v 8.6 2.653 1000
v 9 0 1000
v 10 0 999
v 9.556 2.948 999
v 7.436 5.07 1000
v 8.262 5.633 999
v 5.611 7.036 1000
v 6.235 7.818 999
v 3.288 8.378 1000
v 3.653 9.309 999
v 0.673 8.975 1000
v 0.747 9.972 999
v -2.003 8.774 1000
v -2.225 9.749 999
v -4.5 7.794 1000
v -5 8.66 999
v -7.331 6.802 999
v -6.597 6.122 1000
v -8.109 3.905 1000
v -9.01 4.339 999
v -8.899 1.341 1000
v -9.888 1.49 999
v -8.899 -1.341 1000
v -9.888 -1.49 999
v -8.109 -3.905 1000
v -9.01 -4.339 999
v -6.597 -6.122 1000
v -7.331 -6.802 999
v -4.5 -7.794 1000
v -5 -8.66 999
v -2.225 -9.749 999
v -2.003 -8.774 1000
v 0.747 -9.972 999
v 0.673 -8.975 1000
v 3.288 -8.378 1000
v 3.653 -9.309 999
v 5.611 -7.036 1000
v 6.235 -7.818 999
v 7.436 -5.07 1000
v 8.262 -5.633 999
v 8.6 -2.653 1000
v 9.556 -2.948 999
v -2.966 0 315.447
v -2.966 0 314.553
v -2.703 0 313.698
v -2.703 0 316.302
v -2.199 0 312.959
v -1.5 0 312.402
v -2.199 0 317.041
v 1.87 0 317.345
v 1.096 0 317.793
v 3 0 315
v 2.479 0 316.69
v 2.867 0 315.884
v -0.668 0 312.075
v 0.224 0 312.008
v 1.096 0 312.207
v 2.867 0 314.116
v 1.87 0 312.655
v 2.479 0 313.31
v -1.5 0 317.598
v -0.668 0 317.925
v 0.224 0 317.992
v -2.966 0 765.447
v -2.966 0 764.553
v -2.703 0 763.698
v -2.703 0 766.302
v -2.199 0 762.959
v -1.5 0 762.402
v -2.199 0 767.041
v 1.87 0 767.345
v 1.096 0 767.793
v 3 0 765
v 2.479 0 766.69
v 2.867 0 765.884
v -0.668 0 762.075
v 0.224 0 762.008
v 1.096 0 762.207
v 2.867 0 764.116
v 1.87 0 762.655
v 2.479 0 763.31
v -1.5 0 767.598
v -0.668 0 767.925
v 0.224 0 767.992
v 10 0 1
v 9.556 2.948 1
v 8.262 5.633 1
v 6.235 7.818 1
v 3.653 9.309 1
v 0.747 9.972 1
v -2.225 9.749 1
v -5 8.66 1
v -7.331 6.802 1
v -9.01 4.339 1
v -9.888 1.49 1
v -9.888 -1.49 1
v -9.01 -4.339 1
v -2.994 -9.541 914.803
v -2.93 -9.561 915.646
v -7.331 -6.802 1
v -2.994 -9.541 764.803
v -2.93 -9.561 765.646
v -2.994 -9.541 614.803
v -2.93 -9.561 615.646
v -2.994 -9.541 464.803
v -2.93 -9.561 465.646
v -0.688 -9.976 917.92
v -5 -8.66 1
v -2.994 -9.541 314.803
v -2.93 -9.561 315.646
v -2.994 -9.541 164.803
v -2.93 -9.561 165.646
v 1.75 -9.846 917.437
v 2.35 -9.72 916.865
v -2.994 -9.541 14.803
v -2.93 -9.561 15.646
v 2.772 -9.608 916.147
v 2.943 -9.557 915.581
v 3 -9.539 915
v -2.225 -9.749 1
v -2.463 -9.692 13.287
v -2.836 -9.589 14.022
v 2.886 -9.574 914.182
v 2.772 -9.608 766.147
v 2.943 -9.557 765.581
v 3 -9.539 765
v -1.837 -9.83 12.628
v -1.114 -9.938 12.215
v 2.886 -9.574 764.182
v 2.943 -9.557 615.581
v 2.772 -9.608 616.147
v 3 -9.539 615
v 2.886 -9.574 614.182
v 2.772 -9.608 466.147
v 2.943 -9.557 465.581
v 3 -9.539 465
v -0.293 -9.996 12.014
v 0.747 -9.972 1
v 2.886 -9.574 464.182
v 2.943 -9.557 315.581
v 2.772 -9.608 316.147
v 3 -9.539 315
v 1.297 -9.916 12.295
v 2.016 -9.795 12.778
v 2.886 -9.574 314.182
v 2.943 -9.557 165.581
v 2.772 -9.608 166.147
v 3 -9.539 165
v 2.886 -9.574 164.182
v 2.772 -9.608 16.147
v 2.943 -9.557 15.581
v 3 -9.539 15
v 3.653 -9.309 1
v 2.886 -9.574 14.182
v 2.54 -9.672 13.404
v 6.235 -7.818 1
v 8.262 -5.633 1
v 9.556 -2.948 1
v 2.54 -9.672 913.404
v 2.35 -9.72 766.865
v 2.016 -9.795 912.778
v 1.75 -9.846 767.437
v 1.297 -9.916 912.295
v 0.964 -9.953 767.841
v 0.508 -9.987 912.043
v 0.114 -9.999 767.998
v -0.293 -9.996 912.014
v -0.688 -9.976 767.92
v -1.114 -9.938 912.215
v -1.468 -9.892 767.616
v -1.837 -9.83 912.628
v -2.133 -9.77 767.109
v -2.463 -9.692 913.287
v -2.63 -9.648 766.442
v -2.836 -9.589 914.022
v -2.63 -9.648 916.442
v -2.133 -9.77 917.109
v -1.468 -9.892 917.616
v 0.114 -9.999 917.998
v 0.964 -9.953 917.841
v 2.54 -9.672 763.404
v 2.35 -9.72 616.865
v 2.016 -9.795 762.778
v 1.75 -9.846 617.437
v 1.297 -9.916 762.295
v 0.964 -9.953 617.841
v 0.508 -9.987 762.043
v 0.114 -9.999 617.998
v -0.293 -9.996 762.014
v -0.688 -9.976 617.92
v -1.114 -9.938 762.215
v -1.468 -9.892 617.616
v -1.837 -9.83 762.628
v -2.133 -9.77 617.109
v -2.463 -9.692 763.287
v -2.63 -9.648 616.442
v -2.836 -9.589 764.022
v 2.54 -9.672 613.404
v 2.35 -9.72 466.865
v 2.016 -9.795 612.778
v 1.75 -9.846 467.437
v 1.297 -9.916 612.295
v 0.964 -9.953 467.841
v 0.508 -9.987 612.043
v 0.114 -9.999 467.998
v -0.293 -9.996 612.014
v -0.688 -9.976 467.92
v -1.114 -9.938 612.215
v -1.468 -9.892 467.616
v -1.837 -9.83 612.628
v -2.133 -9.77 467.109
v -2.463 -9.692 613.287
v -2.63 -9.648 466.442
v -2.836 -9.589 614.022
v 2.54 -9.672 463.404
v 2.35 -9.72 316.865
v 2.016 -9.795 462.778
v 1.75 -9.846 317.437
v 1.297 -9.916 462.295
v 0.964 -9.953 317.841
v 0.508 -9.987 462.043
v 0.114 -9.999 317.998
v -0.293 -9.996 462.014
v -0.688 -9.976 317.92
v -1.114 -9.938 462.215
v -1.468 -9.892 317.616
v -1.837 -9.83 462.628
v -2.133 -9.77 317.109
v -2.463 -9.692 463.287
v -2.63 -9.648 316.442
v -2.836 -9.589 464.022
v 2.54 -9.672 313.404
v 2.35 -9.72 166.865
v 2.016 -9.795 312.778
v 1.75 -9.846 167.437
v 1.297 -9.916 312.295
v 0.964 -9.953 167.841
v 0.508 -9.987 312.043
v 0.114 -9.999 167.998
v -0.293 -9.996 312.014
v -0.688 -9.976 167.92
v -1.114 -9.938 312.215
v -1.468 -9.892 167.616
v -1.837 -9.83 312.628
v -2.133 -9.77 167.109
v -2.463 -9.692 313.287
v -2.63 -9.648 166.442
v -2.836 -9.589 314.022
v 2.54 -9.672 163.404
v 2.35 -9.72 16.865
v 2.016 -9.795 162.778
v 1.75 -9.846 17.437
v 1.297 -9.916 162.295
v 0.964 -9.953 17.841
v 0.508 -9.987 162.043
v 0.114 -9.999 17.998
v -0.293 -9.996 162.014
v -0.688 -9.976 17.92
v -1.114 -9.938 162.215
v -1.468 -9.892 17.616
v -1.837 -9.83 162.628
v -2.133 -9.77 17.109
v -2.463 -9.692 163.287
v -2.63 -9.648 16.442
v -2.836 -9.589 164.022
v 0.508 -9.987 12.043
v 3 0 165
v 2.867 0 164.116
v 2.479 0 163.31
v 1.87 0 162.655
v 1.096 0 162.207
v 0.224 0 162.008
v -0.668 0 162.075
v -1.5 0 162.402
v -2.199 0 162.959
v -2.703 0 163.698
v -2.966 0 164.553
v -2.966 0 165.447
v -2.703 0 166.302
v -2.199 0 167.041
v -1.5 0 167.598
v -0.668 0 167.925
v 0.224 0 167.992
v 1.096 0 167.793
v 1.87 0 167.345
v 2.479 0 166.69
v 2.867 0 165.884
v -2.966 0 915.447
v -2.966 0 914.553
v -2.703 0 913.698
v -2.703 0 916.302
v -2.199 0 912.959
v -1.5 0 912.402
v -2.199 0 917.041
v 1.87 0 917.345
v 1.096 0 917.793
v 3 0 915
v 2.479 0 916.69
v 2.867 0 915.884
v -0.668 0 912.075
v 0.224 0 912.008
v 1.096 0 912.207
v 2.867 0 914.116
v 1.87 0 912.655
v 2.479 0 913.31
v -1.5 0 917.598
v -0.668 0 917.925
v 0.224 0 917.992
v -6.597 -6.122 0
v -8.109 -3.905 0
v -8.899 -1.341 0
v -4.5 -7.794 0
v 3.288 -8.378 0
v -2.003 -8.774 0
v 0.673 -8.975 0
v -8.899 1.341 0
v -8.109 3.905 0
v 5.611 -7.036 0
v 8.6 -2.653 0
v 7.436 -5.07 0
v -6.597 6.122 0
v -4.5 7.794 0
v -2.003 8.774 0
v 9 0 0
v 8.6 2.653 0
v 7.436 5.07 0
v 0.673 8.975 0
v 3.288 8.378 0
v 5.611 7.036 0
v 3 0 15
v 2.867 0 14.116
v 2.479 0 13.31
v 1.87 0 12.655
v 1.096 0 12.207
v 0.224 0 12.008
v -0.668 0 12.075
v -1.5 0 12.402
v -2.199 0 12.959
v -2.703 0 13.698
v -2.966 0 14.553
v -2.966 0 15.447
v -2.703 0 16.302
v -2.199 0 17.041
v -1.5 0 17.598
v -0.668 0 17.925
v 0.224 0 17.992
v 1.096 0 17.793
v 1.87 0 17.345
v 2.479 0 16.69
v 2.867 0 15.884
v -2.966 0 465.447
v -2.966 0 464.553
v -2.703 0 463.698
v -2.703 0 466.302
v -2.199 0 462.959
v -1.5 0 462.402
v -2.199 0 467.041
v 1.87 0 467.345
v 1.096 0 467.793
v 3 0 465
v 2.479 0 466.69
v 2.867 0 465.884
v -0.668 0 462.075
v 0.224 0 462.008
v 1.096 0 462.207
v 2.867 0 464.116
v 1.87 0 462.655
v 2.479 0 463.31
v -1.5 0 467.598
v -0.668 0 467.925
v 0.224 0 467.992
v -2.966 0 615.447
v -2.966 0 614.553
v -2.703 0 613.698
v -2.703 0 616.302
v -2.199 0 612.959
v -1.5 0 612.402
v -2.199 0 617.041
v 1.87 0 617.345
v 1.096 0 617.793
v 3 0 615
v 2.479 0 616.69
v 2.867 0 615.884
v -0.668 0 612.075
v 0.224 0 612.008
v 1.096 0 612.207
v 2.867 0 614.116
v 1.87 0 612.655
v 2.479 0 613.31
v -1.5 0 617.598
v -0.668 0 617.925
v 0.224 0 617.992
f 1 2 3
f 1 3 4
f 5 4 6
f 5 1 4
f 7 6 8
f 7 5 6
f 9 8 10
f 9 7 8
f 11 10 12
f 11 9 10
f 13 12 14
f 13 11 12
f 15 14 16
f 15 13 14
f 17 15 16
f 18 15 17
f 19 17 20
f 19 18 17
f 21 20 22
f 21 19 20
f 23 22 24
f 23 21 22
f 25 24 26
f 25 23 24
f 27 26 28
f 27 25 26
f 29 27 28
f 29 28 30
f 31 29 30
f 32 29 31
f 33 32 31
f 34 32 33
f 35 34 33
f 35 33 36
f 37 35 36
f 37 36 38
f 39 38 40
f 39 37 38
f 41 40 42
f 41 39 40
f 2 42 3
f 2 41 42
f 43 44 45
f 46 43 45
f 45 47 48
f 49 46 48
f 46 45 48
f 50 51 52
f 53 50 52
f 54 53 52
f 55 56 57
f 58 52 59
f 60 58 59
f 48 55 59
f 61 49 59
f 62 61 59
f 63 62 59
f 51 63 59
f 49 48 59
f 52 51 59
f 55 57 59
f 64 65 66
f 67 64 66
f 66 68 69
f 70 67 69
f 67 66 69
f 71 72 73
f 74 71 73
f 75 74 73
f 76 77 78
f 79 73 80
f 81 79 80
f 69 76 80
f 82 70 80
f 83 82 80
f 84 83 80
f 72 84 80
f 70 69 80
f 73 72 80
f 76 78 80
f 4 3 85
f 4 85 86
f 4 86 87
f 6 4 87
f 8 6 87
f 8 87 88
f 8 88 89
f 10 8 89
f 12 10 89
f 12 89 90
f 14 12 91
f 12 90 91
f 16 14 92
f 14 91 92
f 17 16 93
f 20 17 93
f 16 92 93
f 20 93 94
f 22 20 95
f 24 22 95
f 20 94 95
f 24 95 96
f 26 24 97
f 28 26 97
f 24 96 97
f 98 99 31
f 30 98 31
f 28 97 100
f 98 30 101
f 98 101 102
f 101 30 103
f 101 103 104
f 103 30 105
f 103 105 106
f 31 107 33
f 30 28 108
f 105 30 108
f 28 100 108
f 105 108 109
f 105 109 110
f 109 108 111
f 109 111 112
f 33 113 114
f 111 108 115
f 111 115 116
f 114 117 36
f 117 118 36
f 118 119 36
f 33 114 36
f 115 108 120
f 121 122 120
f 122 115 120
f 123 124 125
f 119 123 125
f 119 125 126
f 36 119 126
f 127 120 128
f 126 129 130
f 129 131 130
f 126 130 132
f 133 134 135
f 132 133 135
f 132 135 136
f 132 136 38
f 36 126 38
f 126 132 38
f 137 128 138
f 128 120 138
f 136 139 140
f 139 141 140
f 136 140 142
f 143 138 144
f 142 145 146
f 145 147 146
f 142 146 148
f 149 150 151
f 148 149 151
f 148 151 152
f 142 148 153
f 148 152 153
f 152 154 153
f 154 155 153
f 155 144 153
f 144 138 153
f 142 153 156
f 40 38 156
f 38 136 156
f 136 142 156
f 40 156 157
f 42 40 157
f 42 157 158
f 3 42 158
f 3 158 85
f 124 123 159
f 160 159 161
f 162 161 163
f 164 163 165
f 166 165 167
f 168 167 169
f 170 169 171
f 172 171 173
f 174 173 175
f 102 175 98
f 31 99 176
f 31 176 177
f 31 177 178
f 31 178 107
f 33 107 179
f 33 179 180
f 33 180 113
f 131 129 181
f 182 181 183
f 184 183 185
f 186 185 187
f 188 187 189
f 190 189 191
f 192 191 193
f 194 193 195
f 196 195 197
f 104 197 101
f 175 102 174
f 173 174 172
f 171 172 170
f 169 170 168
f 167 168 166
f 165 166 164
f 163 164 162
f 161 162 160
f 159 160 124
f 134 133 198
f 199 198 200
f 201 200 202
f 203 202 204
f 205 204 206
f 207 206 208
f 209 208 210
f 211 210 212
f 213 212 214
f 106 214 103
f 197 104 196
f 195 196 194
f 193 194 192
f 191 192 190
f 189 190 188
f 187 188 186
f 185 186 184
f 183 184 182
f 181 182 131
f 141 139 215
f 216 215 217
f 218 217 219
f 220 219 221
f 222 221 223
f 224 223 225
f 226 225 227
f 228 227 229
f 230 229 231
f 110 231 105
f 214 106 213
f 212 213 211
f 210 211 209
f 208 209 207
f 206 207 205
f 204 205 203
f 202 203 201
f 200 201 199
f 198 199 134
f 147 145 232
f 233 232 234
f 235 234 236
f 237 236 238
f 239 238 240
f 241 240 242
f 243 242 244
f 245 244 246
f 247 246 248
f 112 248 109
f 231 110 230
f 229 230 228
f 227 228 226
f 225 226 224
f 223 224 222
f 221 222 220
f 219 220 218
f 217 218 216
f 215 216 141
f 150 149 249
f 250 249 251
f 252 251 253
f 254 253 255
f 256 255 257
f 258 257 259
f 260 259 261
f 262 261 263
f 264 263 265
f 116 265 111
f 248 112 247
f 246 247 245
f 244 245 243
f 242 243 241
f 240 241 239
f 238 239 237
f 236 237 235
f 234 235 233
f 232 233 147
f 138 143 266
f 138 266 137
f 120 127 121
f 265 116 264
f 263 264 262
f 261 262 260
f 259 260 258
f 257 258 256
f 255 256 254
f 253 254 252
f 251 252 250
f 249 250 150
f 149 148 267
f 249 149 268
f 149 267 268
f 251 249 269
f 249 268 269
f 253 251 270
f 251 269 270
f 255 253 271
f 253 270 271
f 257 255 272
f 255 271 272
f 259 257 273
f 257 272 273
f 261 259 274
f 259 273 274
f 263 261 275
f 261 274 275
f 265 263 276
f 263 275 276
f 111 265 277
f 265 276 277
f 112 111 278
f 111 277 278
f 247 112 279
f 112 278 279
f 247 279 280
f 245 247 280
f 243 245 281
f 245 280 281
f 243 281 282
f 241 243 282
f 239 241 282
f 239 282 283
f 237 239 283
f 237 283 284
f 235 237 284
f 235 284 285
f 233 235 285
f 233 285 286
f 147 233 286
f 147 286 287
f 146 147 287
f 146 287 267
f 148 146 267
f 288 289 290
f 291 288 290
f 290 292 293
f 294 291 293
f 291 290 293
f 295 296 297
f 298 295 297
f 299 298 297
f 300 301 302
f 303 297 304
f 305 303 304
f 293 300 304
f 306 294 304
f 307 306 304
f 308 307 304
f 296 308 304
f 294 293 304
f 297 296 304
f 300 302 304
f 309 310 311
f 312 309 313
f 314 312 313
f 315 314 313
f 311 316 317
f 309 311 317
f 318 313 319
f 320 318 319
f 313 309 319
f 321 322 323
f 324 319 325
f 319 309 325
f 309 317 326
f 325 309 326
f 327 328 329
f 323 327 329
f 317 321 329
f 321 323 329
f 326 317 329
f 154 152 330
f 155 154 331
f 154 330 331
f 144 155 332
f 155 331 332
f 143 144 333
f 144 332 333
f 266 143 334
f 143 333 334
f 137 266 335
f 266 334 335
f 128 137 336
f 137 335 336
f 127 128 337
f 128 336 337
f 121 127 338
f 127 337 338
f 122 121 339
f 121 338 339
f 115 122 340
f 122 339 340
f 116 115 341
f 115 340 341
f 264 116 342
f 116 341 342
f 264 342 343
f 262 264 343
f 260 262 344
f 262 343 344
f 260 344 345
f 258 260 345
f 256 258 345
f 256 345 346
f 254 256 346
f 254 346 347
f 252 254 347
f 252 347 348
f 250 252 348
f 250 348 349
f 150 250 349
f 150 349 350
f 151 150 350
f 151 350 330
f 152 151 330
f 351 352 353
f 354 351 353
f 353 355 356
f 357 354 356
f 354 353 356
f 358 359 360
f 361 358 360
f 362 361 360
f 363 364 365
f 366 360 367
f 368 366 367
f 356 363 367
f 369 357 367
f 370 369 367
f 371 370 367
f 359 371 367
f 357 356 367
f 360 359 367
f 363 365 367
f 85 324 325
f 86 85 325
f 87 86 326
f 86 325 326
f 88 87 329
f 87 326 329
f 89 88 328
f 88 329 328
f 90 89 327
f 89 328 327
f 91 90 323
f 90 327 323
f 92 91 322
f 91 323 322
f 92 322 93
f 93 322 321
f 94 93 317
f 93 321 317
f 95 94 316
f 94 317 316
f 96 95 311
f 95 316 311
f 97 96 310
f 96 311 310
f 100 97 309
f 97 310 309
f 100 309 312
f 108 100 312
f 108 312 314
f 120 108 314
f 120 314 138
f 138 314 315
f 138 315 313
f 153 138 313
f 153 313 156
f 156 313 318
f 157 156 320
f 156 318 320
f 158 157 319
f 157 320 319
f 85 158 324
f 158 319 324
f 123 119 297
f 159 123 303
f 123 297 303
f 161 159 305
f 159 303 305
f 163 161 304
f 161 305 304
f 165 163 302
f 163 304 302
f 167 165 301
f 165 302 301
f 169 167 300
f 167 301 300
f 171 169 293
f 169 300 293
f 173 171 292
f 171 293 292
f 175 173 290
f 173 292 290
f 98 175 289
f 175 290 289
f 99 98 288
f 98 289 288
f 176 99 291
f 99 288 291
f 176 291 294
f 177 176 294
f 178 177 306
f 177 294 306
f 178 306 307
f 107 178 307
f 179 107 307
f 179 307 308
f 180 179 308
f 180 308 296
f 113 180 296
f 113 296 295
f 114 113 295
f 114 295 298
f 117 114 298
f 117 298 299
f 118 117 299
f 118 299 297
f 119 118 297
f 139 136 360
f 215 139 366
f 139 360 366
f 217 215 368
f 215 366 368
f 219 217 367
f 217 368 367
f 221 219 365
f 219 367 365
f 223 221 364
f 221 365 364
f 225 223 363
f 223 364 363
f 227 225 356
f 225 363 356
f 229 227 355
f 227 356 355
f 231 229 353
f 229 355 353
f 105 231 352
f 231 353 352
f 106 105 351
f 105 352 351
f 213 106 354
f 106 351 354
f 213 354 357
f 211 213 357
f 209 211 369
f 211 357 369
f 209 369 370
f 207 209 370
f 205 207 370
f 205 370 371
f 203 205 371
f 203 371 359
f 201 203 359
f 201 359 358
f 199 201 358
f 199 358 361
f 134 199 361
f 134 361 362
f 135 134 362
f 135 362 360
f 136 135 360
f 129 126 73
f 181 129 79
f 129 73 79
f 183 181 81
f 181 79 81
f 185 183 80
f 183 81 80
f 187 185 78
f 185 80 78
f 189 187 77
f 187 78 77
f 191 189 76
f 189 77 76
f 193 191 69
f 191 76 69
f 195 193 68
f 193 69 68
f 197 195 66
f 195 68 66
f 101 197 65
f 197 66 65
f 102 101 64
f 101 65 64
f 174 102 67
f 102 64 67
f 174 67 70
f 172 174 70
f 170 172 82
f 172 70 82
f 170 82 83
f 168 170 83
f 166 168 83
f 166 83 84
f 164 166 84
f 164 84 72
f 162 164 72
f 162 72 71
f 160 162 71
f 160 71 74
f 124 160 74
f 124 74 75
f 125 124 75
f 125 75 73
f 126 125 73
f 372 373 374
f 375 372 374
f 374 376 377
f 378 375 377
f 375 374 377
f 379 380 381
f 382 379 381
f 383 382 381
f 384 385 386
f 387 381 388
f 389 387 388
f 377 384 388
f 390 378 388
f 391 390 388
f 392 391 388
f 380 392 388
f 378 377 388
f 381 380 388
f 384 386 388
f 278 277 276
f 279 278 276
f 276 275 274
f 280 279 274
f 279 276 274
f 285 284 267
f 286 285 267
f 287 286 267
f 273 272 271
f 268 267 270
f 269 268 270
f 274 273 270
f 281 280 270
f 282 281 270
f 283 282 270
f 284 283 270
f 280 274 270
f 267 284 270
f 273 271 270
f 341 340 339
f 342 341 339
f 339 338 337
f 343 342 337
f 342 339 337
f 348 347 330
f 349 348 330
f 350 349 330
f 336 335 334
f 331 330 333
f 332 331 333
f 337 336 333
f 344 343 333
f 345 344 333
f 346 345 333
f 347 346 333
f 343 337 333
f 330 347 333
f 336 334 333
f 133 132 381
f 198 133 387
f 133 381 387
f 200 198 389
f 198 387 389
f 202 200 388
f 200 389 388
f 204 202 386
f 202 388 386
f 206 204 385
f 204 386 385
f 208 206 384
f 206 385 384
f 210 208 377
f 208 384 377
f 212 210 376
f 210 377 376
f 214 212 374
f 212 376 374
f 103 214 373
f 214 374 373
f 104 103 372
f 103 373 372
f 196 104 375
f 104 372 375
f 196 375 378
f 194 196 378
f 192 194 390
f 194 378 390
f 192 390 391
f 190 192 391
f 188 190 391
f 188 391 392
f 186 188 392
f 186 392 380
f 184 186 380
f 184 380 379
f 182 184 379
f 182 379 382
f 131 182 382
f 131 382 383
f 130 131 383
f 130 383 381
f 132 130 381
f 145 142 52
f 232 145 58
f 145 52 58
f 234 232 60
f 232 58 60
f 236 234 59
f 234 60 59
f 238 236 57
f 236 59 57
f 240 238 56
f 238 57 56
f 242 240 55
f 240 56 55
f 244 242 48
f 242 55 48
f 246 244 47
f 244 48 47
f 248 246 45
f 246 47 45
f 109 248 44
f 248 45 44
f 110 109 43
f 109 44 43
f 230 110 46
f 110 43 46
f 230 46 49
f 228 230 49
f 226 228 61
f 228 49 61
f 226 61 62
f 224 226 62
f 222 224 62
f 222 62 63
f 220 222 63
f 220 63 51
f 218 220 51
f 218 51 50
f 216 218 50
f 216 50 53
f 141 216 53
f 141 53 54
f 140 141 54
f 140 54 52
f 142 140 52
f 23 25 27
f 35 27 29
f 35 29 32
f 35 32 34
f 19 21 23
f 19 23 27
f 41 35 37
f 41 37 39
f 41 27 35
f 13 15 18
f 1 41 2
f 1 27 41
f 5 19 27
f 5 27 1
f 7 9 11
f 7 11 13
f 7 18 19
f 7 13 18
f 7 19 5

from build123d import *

# Parameters (mm, degrees)
SKETCH1_R           = 10
BOSS_EXTRUDE1_DEPTH = 1000
CHAMFER1_SIZE       = 1
SKETCH2_R           = 3
CUT_EXTRUDE1_DEPTH  = 10
LPATTERN1_COUNT     = 7
LPATTERN1_PITCH     = 150


with BuildPart() as part:
    # Sketch1 → Boss-Extrude1 (new body)
    with BuildSketch(Plane.XY):
        Circle(SKETCH1_R)
    extrude(amount=BOSS_EXTRUDE1_DEPTH)

    # Chamfer1
    chamfer1_edges = [part.edges().sort_by_distance(p)[0] for p in [
        (-10, 0, 0),
        (-10, 0, 1000),
    ]]
    chamfer(chamfer1_edges, length=CHAMFER1_SIZE)

    # Sketch2 → Cut-Extrude1 (cut)
    with BuildSketch(Plane(origin=(0, 0, 0), x_dir=(1, 0, 0), z_dir=(0, 1, 0))):
        with Locations((0, -15)):
            Circle(SKETCH2_R)
    cut_extrude1 = extrude(amount=-CUT_EXTRUDE1_DEPTH, mode=Mode.SUBTRACT)

    # LPattern1: Cut-Extrude1 ×7
    with Locations(*[(0, 0, i * LPATTERN1_PITCH) for i in range(1, LPATTERN1_COUNT)]):
        add(cut_extrude1, mode=Mode.SUBTRACT)


solid = part.part
